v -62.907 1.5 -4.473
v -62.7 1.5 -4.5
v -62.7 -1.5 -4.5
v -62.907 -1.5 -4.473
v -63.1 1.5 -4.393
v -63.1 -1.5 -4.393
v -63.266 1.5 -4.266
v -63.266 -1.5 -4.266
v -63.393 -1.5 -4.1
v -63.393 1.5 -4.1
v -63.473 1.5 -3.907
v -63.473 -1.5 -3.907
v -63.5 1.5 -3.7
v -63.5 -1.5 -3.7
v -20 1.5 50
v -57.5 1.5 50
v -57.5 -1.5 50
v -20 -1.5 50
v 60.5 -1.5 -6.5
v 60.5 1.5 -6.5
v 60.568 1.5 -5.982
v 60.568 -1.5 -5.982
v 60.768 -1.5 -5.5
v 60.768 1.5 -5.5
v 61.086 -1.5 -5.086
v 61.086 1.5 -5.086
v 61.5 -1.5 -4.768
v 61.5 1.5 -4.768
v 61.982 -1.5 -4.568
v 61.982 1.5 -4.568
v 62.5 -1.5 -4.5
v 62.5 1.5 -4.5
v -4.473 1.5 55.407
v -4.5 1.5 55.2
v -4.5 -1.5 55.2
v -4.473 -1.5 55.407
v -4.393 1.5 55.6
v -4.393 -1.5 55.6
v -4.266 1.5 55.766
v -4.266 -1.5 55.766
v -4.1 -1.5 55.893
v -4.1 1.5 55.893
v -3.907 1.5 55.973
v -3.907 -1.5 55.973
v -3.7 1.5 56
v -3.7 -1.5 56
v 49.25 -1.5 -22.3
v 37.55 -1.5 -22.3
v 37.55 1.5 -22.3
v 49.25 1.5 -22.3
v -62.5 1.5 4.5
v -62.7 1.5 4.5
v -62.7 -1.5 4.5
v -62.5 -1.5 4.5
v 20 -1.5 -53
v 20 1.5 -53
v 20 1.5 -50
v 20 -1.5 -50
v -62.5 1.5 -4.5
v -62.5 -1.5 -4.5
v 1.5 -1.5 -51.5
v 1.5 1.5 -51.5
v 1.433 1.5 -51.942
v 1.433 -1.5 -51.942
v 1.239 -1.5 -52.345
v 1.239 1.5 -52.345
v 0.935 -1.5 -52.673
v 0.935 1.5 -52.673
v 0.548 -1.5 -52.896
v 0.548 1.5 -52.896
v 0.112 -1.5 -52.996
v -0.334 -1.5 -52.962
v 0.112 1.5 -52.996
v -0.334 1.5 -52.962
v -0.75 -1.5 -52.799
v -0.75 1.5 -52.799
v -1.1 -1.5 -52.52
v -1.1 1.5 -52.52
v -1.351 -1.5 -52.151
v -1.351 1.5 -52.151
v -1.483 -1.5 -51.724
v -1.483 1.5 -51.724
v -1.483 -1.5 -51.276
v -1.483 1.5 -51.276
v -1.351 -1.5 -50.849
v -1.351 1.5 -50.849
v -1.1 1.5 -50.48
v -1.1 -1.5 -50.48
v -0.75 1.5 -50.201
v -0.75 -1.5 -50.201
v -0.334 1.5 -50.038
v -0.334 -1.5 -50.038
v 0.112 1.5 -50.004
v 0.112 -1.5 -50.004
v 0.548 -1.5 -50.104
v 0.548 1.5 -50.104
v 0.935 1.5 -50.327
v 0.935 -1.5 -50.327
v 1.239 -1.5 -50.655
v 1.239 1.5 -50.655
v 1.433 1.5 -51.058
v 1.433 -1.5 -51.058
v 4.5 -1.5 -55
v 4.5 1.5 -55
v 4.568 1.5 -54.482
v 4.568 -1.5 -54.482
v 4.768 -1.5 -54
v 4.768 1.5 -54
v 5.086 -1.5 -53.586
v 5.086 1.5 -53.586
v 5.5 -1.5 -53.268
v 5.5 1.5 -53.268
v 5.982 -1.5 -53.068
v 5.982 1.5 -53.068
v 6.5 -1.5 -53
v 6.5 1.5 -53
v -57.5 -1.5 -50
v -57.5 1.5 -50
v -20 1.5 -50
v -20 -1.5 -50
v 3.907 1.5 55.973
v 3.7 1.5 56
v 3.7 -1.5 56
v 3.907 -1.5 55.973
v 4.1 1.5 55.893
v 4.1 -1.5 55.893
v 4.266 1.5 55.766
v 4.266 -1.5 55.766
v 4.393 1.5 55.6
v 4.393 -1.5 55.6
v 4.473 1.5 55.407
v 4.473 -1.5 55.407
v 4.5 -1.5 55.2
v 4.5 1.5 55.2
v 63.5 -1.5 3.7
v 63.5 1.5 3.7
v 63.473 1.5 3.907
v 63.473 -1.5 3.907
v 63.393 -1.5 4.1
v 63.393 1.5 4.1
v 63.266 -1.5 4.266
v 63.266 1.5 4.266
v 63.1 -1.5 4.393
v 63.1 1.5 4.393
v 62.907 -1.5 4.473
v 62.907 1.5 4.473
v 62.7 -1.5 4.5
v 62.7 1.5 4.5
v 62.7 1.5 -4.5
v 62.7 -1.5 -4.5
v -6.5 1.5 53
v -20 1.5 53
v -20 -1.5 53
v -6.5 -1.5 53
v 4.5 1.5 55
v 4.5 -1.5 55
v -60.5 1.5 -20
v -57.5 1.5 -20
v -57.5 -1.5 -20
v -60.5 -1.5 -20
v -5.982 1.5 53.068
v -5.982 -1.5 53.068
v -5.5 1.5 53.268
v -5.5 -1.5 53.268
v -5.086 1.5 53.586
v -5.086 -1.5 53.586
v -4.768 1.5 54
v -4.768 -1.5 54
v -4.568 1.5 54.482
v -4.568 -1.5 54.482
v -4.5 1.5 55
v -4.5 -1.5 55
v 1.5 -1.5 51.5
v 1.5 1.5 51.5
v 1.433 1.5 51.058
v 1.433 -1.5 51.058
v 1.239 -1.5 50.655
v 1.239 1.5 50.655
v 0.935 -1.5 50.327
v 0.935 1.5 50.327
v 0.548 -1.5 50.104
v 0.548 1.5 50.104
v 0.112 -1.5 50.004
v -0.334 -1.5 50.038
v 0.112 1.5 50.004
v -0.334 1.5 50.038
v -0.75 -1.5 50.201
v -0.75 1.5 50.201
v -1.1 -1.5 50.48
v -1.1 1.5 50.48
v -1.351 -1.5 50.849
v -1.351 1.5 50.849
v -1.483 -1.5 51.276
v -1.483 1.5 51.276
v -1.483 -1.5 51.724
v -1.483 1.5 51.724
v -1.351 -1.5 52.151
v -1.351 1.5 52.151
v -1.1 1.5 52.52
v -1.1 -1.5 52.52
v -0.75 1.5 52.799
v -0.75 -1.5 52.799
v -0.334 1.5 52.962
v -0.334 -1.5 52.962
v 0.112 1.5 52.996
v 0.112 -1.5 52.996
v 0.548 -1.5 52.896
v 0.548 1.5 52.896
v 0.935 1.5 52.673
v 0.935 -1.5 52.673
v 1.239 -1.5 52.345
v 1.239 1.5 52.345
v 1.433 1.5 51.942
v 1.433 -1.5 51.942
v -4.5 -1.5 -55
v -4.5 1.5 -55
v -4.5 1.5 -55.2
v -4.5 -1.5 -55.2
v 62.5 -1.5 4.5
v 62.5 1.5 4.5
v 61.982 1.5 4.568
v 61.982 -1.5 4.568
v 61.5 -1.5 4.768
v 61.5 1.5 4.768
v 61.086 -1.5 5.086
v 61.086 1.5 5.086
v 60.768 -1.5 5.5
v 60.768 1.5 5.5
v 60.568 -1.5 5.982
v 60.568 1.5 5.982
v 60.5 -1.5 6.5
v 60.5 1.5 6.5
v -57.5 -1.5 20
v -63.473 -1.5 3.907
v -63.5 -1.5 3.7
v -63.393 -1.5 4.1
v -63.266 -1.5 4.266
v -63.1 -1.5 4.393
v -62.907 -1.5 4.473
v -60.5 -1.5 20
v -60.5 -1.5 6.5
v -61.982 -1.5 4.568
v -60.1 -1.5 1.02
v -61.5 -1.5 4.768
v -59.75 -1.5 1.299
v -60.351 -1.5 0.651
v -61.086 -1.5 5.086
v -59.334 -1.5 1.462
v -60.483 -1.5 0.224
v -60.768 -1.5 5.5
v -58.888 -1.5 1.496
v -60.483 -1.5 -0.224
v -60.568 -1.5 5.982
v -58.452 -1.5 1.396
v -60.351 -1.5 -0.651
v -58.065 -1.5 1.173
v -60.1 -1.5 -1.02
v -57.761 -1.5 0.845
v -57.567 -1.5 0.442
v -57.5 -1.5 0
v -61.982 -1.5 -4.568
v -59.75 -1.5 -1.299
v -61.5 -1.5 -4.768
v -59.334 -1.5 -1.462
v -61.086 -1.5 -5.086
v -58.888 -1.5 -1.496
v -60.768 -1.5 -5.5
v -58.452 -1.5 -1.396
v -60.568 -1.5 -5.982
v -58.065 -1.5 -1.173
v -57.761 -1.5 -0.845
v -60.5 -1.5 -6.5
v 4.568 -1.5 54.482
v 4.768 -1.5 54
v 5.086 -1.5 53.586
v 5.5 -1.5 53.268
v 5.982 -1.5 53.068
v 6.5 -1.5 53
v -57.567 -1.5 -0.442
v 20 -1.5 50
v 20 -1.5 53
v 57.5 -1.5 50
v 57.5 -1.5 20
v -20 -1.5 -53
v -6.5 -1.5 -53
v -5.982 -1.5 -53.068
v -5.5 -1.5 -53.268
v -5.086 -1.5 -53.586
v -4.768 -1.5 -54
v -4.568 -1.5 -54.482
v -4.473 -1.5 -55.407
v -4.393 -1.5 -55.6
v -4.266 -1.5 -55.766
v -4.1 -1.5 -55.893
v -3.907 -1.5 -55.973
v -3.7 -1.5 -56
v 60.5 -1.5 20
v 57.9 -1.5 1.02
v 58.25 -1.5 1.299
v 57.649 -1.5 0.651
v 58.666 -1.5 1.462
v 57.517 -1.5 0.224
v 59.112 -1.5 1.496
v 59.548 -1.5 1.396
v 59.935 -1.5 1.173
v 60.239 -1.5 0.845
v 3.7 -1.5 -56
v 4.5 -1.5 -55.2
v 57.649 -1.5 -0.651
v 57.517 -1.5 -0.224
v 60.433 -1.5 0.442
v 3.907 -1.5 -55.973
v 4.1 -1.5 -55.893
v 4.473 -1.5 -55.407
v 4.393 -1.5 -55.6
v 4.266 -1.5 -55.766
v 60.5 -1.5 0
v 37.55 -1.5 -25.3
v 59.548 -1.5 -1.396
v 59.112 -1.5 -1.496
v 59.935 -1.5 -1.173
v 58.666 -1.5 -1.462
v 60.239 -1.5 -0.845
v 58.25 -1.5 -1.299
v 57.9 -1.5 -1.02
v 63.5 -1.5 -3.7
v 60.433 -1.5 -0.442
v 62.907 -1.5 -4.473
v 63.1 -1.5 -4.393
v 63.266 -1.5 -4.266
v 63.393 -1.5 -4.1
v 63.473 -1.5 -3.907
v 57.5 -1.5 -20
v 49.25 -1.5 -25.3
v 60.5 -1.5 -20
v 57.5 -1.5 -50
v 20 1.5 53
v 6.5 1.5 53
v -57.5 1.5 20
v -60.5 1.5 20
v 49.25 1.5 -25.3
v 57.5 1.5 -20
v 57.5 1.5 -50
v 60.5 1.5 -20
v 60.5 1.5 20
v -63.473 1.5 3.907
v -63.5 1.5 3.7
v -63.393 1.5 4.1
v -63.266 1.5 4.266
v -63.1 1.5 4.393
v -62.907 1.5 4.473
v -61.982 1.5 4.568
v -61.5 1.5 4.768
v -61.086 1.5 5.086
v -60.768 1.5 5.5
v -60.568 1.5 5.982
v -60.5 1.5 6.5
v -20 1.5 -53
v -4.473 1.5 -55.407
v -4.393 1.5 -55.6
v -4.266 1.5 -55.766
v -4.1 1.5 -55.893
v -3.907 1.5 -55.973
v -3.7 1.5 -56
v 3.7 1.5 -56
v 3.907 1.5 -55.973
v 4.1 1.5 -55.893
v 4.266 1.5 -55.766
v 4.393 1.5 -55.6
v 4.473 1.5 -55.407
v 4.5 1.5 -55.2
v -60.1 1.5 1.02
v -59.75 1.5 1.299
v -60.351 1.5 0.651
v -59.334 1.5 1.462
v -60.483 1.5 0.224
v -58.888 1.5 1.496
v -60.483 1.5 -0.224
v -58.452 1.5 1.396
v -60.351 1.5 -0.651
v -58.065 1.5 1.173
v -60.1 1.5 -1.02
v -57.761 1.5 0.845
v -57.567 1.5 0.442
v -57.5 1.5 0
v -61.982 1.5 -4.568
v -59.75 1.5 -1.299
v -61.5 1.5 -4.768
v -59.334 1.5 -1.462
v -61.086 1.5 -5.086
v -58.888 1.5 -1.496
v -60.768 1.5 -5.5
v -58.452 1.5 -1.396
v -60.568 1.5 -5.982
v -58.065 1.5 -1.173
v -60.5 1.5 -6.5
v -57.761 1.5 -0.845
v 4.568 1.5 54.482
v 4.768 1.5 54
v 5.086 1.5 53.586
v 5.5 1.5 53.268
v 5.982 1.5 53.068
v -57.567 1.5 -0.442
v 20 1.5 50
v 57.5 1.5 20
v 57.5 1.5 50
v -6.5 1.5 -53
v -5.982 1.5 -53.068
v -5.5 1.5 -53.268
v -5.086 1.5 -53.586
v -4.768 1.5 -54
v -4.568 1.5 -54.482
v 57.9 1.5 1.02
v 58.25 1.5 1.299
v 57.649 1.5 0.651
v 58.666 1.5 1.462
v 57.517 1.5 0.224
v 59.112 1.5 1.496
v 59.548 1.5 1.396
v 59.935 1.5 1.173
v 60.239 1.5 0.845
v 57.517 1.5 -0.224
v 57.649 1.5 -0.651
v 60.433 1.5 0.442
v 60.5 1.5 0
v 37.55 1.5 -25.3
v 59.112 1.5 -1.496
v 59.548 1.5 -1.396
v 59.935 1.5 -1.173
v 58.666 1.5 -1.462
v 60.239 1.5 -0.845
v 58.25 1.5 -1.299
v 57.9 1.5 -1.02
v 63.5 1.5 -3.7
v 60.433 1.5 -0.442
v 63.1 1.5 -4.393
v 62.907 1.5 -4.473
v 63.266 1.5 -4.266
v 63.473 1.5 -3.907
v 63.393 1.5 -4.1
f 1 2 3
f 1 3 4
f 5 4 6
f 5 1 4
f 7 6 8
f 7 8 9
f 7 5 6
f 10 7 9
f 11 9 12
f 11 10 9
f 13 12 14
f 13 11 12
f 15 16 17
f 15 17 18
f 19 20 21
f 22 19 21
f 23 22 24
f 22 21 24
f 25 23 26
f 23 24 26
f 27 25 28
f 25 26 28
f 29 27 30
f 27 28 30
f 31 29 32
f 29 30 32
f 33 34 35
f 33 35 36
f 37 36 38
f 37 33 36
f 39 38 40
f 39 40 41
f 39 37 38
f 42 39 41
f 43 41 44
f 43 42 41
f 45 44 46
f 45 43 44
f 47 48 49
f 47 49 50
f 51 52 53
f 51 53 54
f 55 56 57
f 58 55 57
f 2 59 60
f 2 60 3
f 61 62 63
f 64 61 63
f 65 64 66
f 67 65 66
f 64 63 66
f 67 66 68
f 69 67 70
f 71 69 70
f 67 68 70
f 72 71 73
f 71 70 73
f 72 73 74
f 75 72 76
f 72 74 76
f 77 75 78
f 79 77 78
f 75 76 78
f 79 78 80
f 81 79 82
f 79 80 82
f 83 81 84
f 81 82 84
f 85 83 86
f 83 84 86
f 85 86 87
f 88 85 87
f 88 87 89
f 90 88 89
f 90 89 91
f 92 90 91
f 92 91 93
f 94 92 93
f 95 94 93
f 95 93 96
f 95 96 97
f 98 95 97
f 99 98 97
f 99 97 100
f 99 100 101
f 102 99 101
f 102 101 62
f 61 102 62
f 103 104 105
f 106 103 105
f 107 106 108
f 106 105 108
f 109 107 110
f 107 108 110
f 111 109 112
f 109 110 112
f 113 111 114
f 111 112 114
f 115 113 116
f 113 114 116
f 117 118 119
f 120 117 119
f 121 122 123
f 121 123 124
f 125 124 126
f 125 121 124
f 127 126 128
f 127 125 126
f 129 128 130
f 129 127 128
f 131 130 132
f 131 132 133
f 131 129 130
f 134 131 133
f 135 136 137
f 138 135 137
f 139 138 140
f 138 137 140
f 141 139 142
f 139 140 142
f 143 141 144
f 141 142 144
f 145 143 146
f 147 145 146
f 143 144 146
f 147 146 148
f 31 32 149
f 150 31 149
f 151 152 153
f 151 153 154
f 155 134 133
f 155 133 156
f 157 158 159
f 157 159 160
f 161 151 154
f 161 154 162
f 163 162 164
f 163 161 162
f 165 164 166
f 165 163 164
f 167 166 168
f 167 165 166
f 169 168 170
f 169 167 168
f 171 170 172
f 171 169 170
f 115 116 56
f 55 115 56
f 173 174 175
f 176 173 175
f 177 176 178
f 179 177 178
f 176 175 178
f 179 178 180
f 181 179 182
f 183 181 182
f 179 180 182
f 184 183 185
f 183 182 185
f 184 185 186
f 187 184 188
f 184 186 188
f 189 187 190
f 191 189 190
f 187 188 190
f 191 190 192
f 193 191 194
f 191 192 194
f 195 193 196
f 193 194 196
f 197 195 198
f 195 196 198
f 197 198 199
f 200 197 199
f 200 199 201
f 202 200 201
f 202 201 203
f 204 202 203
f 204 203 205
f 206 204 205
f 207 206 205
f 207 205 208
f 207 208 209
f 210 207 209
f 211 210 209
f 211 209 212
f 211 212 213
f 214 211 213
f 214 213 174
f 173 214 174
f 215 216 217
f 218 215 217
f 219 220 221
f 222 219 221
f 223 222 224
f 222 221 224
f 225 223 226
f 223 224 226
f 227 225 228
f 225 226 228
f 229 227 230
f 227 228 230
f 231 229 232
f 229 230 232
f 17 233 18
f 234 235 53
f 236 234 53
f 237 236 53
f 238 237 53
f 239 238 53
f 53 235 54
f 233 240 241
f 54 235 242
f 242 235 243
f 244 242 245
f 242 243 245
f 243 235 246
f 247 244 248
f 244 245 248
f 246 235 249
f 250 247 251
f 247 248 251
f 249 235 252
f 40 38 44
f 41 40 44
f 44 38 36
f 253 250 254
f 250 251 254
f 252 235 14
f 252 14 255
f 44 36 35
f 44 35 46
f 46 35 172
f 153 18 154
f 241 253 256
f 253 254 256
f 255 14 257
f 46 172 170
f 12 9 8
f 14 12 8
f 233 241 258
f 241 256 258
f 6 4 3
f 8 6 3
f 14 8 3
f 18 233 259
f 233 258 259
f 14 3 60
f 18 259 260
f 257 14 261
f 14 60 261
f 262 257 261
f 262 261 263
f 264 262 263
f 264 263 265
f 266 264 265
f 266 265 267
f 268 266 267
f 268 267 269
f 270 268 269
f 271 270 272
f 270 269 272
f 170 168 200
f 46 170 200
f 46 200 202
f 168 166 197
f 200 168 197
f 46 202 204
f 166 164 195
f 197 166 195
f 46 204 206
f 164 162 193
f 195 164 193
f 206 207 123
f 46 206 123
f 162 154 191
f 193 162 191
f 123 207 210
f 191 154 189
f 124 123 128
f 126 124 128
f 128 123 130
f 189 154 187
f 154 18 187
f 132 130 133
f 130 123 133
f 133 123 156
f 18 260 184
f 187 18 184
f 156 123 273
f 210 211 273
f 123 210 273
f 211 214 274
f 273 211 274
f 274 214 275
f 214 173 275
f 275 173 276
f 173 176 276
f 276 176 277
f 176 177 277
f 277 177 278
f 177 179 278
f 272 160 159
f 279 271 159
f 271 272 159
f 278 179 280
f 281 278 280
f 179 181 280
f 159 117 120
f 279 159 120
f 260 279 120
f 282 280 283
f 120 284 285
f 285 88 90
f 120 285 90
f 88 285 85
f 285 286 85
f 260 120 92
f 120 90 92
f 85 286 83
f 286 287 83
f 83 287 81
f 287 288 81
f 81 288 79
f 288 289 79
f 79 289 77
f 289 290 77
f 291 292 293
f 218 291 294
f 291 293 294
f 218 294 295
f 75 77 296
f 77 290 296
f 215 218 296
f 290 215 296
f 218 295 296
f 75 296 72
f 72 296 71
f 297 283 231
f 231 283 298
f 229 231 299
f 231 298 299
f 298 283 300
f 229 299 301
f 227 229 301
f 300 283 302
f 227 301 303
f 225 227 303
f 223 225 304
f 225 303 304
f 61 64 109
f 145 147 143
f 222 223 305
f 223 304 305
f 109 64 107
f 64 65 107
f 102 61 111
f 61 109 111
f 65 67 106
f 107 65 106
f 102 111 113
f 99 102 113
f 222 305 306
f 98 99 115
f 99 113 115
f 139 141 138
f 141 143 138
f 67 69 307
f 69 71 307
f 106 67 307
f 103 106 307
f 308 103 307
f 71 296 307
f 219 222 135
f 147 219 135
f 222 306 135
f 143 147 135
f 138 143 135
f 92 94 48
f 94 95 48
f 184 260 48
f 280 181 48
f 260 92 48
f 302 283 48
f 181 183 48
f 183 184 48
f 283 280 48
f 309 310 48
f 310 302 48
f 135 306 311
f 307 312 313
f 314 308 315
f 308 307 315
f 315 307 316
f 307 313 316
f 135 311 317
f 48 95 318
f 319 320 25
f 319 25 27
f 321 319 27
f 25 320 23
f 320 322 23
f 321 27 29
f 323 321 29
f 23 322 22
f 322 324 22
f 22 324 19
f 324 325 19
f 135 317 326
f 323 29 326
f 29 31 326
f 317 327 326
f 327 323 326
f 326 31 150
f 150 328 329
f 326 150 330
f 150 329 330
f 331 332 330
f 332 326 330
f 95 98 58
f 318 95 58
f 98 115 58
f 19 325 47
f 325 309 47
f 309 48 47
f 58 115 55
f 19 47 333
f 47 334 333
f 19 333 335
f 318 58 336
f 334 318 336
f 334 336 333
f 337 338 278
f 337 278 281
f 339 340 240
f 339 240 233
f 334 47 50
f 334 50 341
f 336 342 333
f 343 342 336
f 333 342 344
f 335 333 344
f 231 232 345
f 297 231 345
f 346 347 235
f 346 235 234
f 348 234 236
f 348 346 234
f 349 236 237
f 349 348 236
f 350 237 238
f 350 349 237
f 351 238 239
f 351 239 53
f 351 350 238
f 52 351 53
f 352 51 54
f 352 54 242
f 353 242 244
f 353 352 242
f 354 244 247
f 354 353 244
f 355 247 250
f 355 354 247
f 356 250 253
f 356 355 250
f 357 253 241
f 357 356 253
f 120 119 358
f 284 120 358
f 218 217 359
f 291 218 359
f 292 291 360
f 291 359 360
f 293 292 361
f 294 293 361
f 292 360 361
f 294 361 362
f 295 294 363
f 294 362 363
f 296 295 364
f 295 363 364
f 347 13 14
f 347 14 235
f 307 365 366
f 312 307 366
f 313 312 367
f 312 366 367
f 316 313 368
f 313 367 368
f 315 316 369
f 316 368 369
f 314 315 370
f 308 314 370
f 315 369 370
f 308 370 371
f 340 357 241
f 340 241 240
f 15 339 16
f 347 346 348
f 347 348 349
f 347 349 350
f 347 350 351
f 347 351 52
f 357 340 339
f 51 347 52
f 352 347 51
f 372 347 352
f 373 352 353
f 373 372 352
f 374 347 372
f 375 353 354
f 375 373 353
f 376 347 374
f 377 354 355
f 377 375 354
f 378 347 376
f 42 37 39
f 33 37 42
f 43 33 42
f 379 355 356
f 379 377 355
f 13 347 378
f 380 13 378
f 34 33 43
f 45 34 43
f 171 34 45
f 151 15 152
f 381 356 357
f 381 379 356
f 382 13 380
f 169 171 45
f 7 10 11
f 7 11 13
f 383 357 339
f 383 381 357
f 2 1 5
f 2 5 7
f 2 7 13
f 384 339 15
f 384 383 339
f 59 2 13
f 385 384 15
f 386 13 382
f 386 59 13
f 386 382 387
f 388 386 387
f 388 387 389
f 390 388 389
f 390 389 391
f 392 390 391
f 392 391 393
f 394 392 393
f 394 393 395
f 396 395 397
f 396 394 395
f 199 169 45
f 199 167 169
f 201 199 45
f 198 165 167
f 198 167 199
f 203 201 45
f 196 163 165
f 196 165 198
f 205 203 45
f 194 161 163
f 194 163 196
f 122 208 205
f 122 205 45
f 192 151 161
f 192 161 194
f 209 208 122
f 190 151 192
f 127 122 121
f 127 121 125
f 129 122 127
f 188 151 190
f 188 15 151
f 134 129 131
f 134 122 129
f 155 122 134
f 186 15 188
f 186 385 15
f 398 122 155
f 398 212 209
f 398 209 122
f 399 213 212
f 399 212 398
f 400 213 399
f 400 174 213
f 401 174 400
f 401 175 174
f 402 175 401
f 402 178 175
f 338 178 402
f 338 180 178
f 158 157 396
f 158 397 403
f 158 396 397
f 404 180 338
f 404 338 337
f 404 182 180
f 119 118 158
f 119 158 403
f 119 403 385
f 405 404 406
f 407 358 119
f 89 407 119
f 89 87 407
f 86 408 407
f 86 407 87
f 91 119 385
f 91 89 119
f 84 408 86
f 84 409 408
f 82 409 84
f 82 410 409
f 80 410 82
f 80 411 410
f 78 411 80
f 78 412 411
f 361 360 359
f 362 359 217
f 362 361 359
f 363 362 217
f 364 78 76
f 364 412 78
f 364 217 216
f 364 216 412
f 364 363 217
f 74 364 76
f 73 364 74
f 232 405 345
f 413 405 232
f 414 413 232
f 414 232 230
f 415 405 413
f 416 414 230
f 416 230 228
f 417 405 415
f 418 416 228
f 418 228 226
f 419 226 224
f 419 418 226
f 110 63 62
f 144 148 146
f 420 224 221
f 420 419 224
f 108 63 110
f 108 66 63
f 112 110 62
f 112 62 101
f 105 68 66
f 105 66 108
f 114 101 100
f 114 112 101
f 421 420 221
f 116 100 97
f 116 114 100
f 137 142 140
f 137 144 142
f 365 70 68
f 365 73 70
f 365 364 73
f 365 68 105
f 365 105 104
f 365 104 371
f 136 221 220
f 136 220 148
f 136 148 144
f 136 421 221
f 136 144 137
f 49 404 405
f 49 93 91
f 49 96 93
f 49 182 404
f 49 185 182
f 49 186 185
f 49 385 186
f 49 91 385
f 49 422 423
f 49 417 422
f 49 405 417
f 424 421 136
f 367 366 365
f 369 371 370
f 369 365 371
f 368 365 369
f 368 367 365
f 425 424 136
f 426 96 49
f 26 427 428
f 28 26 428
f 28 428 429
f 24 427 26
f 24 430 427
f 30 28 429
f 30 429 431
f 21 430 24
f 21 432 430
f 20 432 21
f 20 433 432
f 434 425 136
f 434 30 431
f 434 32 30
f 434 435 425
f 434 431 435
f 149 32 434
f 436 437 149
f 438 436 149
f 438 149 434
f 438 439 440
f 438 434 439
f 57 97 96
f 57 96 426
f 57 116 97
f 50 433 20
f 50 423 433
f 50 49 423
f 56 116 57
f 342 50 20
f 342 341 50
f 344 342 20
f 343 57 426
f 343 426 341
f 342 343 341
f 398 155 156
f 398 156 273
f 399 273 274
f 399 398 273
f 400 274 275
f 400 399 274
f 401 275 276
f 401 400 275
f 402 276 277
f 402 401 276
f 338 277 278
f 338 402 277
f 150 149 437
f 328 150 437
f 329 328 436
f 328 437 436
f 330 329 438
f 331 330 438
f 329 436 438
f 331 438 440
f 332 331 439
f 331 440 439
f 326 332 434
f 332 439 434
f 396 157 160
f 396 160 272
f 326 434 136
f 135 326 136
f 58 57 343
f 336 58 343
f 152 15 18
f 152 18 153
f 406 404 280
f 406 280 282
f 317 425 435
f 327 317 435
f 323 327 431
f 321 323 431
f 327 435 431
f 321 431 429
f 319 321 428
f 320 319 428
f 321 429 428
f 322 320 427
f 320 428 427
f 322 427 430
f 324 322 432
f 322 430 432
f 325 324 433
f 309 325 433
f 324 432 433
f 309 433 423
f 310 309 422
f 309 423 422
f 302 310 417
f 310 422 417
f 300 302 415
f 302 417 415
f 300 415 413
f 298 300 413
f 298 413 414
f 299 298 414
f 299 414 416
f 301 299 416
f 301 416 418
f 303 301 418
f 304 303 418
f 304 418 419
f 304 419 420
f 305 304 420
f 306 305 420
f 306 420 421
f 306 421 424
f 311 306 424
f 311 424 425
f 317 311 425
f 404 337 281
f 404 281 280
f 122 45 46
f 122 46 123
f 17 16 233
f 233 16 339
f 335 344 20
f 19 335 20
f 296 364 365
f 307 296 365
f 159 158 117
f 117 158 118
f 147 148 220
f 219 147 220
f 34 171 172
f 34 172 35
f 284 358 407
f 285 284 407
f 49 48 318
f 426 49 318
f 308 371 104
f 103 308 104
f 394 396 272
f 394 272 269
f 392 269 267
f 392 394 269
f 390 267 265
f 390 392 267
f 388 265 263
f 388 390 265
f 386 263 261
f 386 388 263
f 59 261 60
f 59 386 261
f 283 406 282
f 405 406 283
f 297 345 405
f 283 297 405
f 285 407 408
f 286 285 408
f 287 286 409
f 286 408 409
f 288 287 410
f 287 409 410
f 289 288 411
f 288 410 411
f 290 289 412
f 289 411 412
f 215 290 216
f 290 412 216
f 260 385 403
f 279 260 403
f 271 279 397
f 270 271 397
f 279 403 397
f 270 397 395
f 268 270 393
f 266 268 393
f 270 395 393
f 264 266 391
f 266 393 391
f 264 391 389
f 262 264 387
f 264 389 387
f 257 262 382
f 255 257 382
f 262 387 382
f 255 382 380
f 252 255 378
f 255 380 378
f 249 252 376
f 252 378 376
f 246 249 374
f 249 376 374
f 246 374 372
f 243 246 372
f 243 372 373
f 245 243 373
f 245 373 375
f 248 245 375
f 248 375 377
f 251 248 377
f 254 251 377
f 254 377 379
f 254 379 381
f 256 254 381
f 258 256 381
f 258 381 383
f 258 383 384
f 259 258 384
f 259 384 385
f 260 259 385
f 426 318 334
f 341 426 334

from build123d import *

# Parameters (mm, degrees)
ESBO_O1_W                = 115
ESBO_O1_H                = 100
RESSALTO_EXTRUS_O1_DEPTH = 1.5
RESSALTO_EXTRUS_O2_DEPTH = 3
ESBO_O2_R                = 1.5
CORTE_EXTRUS_O1_DEPTH    = 4
SKETCH2_W                = 11.7
SKETCH2_H                = 3
CUT_EXTRUDE3_DEPTH       = 2.5
CUT_EXTRUDE3_DEPTH_BACK  = 2.5


with BuildPart() as part:
    # Esboço1 → Ressalto-extrusão1 (new body, symmetric)
    with BuildSketch(Plane(origin=(0, 0, 0), x_dir=(1, 0, 0), z_dir=(0, 1, 0))):
        Rectangle(ESBO_O1_W, ESBO_O1_H)
    extrude(amount=RESSALTO_EXTRUS_O1_DEPTH, both=True)

    # Esboço4 → Ressalto-extrusão2 (add, through all)
    with BuildSketch(Plane(origin=(0, 1.5, 0), x_dir=(1, 0, 0), z_dir=(0, 1, 0))):
        with BuildLine():
            Line((6.5, 53), (20, 53))
            Line((20, 53), (20, 50))
            Line((20, 50), (-20, 50))
            Line((-20, 50), (-20, 53))
            Line((-20, 53), (-6.5, 53))
            ThreePointArc((-6.5, 53), (-5.085786438, 53.585786438), (-4.5, 55))
            Line((-4.5, 55), (-4.5, 55.2))
            ThreePointArc((-4.5, 55.2), (-4.265685425, 55.765685425), (-3.7, 56))
            Line((-3.7, 56), (3.7, 56))
            ThreePointArc((3.7, 56), (4.265685425, 55.765685425), (4.5, 55.2))
            Line((4.5, 55.2), (4.5, 55))
            ThreePointArc((4.5, 55), (5.085786438, 53.585786438), (6.5, 53))
        make_face()
        with BuildLine():
            Line((-63.5, 3.7), (-63.5, -3.7))
            ThreePointArc((-63.5, -3.7), (-63.265685425, -4.265685425), (-62.7, -4.5))
            Line((-62.7, -4.5), (-62.5, -4.5))
            ThreePointArc((-62.5, -4.5), (-61.085786438, -5.085786438), (-60.5, -6.5))
            Line((-60.5, -6.5), (-60.5, -20))
            Line((-60.5, -20), (-57.5, -20))
            Line((-57.5, -20), (-57.5, 20))
            Line((-57.5, 20), (-60.5, 20))
            Line((-60.5, 20), (-60.5, 6.5))
            ThreePointArc((-60.5, 6.5), (-61.085786438, 5.085786438), (-62.5, 4.5))
            Line((-62.5, 4.5), (-62.7, 4.5))
            ThreePointArc((-62.7, 4.5), (-63.265685425, 4.265685425), (-63.5, 3.7))
        make_face()
        with BuildLine():
            Line((4.5, -55.2), (4.5, -55))
            ThreePointArc((4.5, -55), (5.085786438, -53.585786438), (6.5, -53))
            Line((6.5, -53), (20, -53))
            Line((20, -53), (20, -50))
            Line((20, -50), (-20, -50))
            Line((-20, -50), (-20, -53))
            Line((-20, -53), (-6.5, -53))
            ThreePointArc((-6.5, -53), (-5.085786438, -53.585786438), (-4.5, -55))
            Line((-4.5, -55), (-4.5, -55.2))
            ThreePointArc((-4.5, -55.2), (-4.265685425, -55.765685425), (-3.7, -56))
            Line((-3.7, -56), (3.7, -56))
            ThreePointArc((3.7, -56), (4.265685425, -55.765685425), (4.5, -55.2))
        make_face()
        with BuildLine():
            Line((57.5, 20), (60.5, 20))
            Line((60.5, 20), (60.5, 6.5))
            ThreePointArc((60.5, 6.5), (61.085786438, 5.085786438), (62.5, 4.5))
            Line((62.5, 4.5), (62.7, 4.5))
            ThreePointArc((62.7, 4.5), (63.265685425, 4.265685425), (63.5, 3.7))
            Line((63.5, 3.7), (63.5, -3.7))
            ThreePointArc((63.5, -3.7), (63.265685425, -4.265685425), (62.7, -4.5))
            Line((62.7, -4.5), (62.5, -4.5))
            ThreePointArc((62.5, -4.5), (61.085786438, -5.085786438), (60.5, -6.5))
            Line((60.5, -6.5), (60.5, -20))
            Line((60.5, -20), (57.5, -20))
            Line((57.5, -20), (57.5, 20))
        make_face()
    extrude(amount=-RESSALTO_EXTRUS_O2_DEPTH)

    # Esboço2 → Corte-extrusão1 (cut, through all)
    with BuildSketch(Plane(origin=(0, 1.5, 0), x_dir=(1, 0, 0), z_dir=(0, 1, 0))):
        with Locations((0, -51.5)):
            Circle(ESBO_O2_R)
        with Locations((0, 51.5)):
            Circle(ESBO_O2_R)
        with Locations((59, 0)):
            Circle(ESBO_O2_R)
        with Locations((-59, 0)):
            Circle(ESBO_O2_R)
    extrude(amount=-CORTE_EXTRUS_O1_DEPTH, mode=Mode.SUBTRACT)

    # Sketch2 → Cut-Extrude3 (cut, two sides)
    with BuildSketch(Plane(origin=(0, 0, 0), x_dir=(1, 0, 0), z_dir=(0, 1, 0))) as cut_extrude3_sk:
        with Locations((43.4, 23.8)):
            Rectangle(SKETCH2_W, SKETCH2_H)
    extrude(amount=CUT_EXTRUDE3_DEPTH, mode=Mode.SUBTRACT)
    extrude(cut_extrude3_sk.sketch, amount=-CUT_EXTRUDE3_DEPTH_BACK, mode=Mode.SUBTRACT)


solid = part.part
